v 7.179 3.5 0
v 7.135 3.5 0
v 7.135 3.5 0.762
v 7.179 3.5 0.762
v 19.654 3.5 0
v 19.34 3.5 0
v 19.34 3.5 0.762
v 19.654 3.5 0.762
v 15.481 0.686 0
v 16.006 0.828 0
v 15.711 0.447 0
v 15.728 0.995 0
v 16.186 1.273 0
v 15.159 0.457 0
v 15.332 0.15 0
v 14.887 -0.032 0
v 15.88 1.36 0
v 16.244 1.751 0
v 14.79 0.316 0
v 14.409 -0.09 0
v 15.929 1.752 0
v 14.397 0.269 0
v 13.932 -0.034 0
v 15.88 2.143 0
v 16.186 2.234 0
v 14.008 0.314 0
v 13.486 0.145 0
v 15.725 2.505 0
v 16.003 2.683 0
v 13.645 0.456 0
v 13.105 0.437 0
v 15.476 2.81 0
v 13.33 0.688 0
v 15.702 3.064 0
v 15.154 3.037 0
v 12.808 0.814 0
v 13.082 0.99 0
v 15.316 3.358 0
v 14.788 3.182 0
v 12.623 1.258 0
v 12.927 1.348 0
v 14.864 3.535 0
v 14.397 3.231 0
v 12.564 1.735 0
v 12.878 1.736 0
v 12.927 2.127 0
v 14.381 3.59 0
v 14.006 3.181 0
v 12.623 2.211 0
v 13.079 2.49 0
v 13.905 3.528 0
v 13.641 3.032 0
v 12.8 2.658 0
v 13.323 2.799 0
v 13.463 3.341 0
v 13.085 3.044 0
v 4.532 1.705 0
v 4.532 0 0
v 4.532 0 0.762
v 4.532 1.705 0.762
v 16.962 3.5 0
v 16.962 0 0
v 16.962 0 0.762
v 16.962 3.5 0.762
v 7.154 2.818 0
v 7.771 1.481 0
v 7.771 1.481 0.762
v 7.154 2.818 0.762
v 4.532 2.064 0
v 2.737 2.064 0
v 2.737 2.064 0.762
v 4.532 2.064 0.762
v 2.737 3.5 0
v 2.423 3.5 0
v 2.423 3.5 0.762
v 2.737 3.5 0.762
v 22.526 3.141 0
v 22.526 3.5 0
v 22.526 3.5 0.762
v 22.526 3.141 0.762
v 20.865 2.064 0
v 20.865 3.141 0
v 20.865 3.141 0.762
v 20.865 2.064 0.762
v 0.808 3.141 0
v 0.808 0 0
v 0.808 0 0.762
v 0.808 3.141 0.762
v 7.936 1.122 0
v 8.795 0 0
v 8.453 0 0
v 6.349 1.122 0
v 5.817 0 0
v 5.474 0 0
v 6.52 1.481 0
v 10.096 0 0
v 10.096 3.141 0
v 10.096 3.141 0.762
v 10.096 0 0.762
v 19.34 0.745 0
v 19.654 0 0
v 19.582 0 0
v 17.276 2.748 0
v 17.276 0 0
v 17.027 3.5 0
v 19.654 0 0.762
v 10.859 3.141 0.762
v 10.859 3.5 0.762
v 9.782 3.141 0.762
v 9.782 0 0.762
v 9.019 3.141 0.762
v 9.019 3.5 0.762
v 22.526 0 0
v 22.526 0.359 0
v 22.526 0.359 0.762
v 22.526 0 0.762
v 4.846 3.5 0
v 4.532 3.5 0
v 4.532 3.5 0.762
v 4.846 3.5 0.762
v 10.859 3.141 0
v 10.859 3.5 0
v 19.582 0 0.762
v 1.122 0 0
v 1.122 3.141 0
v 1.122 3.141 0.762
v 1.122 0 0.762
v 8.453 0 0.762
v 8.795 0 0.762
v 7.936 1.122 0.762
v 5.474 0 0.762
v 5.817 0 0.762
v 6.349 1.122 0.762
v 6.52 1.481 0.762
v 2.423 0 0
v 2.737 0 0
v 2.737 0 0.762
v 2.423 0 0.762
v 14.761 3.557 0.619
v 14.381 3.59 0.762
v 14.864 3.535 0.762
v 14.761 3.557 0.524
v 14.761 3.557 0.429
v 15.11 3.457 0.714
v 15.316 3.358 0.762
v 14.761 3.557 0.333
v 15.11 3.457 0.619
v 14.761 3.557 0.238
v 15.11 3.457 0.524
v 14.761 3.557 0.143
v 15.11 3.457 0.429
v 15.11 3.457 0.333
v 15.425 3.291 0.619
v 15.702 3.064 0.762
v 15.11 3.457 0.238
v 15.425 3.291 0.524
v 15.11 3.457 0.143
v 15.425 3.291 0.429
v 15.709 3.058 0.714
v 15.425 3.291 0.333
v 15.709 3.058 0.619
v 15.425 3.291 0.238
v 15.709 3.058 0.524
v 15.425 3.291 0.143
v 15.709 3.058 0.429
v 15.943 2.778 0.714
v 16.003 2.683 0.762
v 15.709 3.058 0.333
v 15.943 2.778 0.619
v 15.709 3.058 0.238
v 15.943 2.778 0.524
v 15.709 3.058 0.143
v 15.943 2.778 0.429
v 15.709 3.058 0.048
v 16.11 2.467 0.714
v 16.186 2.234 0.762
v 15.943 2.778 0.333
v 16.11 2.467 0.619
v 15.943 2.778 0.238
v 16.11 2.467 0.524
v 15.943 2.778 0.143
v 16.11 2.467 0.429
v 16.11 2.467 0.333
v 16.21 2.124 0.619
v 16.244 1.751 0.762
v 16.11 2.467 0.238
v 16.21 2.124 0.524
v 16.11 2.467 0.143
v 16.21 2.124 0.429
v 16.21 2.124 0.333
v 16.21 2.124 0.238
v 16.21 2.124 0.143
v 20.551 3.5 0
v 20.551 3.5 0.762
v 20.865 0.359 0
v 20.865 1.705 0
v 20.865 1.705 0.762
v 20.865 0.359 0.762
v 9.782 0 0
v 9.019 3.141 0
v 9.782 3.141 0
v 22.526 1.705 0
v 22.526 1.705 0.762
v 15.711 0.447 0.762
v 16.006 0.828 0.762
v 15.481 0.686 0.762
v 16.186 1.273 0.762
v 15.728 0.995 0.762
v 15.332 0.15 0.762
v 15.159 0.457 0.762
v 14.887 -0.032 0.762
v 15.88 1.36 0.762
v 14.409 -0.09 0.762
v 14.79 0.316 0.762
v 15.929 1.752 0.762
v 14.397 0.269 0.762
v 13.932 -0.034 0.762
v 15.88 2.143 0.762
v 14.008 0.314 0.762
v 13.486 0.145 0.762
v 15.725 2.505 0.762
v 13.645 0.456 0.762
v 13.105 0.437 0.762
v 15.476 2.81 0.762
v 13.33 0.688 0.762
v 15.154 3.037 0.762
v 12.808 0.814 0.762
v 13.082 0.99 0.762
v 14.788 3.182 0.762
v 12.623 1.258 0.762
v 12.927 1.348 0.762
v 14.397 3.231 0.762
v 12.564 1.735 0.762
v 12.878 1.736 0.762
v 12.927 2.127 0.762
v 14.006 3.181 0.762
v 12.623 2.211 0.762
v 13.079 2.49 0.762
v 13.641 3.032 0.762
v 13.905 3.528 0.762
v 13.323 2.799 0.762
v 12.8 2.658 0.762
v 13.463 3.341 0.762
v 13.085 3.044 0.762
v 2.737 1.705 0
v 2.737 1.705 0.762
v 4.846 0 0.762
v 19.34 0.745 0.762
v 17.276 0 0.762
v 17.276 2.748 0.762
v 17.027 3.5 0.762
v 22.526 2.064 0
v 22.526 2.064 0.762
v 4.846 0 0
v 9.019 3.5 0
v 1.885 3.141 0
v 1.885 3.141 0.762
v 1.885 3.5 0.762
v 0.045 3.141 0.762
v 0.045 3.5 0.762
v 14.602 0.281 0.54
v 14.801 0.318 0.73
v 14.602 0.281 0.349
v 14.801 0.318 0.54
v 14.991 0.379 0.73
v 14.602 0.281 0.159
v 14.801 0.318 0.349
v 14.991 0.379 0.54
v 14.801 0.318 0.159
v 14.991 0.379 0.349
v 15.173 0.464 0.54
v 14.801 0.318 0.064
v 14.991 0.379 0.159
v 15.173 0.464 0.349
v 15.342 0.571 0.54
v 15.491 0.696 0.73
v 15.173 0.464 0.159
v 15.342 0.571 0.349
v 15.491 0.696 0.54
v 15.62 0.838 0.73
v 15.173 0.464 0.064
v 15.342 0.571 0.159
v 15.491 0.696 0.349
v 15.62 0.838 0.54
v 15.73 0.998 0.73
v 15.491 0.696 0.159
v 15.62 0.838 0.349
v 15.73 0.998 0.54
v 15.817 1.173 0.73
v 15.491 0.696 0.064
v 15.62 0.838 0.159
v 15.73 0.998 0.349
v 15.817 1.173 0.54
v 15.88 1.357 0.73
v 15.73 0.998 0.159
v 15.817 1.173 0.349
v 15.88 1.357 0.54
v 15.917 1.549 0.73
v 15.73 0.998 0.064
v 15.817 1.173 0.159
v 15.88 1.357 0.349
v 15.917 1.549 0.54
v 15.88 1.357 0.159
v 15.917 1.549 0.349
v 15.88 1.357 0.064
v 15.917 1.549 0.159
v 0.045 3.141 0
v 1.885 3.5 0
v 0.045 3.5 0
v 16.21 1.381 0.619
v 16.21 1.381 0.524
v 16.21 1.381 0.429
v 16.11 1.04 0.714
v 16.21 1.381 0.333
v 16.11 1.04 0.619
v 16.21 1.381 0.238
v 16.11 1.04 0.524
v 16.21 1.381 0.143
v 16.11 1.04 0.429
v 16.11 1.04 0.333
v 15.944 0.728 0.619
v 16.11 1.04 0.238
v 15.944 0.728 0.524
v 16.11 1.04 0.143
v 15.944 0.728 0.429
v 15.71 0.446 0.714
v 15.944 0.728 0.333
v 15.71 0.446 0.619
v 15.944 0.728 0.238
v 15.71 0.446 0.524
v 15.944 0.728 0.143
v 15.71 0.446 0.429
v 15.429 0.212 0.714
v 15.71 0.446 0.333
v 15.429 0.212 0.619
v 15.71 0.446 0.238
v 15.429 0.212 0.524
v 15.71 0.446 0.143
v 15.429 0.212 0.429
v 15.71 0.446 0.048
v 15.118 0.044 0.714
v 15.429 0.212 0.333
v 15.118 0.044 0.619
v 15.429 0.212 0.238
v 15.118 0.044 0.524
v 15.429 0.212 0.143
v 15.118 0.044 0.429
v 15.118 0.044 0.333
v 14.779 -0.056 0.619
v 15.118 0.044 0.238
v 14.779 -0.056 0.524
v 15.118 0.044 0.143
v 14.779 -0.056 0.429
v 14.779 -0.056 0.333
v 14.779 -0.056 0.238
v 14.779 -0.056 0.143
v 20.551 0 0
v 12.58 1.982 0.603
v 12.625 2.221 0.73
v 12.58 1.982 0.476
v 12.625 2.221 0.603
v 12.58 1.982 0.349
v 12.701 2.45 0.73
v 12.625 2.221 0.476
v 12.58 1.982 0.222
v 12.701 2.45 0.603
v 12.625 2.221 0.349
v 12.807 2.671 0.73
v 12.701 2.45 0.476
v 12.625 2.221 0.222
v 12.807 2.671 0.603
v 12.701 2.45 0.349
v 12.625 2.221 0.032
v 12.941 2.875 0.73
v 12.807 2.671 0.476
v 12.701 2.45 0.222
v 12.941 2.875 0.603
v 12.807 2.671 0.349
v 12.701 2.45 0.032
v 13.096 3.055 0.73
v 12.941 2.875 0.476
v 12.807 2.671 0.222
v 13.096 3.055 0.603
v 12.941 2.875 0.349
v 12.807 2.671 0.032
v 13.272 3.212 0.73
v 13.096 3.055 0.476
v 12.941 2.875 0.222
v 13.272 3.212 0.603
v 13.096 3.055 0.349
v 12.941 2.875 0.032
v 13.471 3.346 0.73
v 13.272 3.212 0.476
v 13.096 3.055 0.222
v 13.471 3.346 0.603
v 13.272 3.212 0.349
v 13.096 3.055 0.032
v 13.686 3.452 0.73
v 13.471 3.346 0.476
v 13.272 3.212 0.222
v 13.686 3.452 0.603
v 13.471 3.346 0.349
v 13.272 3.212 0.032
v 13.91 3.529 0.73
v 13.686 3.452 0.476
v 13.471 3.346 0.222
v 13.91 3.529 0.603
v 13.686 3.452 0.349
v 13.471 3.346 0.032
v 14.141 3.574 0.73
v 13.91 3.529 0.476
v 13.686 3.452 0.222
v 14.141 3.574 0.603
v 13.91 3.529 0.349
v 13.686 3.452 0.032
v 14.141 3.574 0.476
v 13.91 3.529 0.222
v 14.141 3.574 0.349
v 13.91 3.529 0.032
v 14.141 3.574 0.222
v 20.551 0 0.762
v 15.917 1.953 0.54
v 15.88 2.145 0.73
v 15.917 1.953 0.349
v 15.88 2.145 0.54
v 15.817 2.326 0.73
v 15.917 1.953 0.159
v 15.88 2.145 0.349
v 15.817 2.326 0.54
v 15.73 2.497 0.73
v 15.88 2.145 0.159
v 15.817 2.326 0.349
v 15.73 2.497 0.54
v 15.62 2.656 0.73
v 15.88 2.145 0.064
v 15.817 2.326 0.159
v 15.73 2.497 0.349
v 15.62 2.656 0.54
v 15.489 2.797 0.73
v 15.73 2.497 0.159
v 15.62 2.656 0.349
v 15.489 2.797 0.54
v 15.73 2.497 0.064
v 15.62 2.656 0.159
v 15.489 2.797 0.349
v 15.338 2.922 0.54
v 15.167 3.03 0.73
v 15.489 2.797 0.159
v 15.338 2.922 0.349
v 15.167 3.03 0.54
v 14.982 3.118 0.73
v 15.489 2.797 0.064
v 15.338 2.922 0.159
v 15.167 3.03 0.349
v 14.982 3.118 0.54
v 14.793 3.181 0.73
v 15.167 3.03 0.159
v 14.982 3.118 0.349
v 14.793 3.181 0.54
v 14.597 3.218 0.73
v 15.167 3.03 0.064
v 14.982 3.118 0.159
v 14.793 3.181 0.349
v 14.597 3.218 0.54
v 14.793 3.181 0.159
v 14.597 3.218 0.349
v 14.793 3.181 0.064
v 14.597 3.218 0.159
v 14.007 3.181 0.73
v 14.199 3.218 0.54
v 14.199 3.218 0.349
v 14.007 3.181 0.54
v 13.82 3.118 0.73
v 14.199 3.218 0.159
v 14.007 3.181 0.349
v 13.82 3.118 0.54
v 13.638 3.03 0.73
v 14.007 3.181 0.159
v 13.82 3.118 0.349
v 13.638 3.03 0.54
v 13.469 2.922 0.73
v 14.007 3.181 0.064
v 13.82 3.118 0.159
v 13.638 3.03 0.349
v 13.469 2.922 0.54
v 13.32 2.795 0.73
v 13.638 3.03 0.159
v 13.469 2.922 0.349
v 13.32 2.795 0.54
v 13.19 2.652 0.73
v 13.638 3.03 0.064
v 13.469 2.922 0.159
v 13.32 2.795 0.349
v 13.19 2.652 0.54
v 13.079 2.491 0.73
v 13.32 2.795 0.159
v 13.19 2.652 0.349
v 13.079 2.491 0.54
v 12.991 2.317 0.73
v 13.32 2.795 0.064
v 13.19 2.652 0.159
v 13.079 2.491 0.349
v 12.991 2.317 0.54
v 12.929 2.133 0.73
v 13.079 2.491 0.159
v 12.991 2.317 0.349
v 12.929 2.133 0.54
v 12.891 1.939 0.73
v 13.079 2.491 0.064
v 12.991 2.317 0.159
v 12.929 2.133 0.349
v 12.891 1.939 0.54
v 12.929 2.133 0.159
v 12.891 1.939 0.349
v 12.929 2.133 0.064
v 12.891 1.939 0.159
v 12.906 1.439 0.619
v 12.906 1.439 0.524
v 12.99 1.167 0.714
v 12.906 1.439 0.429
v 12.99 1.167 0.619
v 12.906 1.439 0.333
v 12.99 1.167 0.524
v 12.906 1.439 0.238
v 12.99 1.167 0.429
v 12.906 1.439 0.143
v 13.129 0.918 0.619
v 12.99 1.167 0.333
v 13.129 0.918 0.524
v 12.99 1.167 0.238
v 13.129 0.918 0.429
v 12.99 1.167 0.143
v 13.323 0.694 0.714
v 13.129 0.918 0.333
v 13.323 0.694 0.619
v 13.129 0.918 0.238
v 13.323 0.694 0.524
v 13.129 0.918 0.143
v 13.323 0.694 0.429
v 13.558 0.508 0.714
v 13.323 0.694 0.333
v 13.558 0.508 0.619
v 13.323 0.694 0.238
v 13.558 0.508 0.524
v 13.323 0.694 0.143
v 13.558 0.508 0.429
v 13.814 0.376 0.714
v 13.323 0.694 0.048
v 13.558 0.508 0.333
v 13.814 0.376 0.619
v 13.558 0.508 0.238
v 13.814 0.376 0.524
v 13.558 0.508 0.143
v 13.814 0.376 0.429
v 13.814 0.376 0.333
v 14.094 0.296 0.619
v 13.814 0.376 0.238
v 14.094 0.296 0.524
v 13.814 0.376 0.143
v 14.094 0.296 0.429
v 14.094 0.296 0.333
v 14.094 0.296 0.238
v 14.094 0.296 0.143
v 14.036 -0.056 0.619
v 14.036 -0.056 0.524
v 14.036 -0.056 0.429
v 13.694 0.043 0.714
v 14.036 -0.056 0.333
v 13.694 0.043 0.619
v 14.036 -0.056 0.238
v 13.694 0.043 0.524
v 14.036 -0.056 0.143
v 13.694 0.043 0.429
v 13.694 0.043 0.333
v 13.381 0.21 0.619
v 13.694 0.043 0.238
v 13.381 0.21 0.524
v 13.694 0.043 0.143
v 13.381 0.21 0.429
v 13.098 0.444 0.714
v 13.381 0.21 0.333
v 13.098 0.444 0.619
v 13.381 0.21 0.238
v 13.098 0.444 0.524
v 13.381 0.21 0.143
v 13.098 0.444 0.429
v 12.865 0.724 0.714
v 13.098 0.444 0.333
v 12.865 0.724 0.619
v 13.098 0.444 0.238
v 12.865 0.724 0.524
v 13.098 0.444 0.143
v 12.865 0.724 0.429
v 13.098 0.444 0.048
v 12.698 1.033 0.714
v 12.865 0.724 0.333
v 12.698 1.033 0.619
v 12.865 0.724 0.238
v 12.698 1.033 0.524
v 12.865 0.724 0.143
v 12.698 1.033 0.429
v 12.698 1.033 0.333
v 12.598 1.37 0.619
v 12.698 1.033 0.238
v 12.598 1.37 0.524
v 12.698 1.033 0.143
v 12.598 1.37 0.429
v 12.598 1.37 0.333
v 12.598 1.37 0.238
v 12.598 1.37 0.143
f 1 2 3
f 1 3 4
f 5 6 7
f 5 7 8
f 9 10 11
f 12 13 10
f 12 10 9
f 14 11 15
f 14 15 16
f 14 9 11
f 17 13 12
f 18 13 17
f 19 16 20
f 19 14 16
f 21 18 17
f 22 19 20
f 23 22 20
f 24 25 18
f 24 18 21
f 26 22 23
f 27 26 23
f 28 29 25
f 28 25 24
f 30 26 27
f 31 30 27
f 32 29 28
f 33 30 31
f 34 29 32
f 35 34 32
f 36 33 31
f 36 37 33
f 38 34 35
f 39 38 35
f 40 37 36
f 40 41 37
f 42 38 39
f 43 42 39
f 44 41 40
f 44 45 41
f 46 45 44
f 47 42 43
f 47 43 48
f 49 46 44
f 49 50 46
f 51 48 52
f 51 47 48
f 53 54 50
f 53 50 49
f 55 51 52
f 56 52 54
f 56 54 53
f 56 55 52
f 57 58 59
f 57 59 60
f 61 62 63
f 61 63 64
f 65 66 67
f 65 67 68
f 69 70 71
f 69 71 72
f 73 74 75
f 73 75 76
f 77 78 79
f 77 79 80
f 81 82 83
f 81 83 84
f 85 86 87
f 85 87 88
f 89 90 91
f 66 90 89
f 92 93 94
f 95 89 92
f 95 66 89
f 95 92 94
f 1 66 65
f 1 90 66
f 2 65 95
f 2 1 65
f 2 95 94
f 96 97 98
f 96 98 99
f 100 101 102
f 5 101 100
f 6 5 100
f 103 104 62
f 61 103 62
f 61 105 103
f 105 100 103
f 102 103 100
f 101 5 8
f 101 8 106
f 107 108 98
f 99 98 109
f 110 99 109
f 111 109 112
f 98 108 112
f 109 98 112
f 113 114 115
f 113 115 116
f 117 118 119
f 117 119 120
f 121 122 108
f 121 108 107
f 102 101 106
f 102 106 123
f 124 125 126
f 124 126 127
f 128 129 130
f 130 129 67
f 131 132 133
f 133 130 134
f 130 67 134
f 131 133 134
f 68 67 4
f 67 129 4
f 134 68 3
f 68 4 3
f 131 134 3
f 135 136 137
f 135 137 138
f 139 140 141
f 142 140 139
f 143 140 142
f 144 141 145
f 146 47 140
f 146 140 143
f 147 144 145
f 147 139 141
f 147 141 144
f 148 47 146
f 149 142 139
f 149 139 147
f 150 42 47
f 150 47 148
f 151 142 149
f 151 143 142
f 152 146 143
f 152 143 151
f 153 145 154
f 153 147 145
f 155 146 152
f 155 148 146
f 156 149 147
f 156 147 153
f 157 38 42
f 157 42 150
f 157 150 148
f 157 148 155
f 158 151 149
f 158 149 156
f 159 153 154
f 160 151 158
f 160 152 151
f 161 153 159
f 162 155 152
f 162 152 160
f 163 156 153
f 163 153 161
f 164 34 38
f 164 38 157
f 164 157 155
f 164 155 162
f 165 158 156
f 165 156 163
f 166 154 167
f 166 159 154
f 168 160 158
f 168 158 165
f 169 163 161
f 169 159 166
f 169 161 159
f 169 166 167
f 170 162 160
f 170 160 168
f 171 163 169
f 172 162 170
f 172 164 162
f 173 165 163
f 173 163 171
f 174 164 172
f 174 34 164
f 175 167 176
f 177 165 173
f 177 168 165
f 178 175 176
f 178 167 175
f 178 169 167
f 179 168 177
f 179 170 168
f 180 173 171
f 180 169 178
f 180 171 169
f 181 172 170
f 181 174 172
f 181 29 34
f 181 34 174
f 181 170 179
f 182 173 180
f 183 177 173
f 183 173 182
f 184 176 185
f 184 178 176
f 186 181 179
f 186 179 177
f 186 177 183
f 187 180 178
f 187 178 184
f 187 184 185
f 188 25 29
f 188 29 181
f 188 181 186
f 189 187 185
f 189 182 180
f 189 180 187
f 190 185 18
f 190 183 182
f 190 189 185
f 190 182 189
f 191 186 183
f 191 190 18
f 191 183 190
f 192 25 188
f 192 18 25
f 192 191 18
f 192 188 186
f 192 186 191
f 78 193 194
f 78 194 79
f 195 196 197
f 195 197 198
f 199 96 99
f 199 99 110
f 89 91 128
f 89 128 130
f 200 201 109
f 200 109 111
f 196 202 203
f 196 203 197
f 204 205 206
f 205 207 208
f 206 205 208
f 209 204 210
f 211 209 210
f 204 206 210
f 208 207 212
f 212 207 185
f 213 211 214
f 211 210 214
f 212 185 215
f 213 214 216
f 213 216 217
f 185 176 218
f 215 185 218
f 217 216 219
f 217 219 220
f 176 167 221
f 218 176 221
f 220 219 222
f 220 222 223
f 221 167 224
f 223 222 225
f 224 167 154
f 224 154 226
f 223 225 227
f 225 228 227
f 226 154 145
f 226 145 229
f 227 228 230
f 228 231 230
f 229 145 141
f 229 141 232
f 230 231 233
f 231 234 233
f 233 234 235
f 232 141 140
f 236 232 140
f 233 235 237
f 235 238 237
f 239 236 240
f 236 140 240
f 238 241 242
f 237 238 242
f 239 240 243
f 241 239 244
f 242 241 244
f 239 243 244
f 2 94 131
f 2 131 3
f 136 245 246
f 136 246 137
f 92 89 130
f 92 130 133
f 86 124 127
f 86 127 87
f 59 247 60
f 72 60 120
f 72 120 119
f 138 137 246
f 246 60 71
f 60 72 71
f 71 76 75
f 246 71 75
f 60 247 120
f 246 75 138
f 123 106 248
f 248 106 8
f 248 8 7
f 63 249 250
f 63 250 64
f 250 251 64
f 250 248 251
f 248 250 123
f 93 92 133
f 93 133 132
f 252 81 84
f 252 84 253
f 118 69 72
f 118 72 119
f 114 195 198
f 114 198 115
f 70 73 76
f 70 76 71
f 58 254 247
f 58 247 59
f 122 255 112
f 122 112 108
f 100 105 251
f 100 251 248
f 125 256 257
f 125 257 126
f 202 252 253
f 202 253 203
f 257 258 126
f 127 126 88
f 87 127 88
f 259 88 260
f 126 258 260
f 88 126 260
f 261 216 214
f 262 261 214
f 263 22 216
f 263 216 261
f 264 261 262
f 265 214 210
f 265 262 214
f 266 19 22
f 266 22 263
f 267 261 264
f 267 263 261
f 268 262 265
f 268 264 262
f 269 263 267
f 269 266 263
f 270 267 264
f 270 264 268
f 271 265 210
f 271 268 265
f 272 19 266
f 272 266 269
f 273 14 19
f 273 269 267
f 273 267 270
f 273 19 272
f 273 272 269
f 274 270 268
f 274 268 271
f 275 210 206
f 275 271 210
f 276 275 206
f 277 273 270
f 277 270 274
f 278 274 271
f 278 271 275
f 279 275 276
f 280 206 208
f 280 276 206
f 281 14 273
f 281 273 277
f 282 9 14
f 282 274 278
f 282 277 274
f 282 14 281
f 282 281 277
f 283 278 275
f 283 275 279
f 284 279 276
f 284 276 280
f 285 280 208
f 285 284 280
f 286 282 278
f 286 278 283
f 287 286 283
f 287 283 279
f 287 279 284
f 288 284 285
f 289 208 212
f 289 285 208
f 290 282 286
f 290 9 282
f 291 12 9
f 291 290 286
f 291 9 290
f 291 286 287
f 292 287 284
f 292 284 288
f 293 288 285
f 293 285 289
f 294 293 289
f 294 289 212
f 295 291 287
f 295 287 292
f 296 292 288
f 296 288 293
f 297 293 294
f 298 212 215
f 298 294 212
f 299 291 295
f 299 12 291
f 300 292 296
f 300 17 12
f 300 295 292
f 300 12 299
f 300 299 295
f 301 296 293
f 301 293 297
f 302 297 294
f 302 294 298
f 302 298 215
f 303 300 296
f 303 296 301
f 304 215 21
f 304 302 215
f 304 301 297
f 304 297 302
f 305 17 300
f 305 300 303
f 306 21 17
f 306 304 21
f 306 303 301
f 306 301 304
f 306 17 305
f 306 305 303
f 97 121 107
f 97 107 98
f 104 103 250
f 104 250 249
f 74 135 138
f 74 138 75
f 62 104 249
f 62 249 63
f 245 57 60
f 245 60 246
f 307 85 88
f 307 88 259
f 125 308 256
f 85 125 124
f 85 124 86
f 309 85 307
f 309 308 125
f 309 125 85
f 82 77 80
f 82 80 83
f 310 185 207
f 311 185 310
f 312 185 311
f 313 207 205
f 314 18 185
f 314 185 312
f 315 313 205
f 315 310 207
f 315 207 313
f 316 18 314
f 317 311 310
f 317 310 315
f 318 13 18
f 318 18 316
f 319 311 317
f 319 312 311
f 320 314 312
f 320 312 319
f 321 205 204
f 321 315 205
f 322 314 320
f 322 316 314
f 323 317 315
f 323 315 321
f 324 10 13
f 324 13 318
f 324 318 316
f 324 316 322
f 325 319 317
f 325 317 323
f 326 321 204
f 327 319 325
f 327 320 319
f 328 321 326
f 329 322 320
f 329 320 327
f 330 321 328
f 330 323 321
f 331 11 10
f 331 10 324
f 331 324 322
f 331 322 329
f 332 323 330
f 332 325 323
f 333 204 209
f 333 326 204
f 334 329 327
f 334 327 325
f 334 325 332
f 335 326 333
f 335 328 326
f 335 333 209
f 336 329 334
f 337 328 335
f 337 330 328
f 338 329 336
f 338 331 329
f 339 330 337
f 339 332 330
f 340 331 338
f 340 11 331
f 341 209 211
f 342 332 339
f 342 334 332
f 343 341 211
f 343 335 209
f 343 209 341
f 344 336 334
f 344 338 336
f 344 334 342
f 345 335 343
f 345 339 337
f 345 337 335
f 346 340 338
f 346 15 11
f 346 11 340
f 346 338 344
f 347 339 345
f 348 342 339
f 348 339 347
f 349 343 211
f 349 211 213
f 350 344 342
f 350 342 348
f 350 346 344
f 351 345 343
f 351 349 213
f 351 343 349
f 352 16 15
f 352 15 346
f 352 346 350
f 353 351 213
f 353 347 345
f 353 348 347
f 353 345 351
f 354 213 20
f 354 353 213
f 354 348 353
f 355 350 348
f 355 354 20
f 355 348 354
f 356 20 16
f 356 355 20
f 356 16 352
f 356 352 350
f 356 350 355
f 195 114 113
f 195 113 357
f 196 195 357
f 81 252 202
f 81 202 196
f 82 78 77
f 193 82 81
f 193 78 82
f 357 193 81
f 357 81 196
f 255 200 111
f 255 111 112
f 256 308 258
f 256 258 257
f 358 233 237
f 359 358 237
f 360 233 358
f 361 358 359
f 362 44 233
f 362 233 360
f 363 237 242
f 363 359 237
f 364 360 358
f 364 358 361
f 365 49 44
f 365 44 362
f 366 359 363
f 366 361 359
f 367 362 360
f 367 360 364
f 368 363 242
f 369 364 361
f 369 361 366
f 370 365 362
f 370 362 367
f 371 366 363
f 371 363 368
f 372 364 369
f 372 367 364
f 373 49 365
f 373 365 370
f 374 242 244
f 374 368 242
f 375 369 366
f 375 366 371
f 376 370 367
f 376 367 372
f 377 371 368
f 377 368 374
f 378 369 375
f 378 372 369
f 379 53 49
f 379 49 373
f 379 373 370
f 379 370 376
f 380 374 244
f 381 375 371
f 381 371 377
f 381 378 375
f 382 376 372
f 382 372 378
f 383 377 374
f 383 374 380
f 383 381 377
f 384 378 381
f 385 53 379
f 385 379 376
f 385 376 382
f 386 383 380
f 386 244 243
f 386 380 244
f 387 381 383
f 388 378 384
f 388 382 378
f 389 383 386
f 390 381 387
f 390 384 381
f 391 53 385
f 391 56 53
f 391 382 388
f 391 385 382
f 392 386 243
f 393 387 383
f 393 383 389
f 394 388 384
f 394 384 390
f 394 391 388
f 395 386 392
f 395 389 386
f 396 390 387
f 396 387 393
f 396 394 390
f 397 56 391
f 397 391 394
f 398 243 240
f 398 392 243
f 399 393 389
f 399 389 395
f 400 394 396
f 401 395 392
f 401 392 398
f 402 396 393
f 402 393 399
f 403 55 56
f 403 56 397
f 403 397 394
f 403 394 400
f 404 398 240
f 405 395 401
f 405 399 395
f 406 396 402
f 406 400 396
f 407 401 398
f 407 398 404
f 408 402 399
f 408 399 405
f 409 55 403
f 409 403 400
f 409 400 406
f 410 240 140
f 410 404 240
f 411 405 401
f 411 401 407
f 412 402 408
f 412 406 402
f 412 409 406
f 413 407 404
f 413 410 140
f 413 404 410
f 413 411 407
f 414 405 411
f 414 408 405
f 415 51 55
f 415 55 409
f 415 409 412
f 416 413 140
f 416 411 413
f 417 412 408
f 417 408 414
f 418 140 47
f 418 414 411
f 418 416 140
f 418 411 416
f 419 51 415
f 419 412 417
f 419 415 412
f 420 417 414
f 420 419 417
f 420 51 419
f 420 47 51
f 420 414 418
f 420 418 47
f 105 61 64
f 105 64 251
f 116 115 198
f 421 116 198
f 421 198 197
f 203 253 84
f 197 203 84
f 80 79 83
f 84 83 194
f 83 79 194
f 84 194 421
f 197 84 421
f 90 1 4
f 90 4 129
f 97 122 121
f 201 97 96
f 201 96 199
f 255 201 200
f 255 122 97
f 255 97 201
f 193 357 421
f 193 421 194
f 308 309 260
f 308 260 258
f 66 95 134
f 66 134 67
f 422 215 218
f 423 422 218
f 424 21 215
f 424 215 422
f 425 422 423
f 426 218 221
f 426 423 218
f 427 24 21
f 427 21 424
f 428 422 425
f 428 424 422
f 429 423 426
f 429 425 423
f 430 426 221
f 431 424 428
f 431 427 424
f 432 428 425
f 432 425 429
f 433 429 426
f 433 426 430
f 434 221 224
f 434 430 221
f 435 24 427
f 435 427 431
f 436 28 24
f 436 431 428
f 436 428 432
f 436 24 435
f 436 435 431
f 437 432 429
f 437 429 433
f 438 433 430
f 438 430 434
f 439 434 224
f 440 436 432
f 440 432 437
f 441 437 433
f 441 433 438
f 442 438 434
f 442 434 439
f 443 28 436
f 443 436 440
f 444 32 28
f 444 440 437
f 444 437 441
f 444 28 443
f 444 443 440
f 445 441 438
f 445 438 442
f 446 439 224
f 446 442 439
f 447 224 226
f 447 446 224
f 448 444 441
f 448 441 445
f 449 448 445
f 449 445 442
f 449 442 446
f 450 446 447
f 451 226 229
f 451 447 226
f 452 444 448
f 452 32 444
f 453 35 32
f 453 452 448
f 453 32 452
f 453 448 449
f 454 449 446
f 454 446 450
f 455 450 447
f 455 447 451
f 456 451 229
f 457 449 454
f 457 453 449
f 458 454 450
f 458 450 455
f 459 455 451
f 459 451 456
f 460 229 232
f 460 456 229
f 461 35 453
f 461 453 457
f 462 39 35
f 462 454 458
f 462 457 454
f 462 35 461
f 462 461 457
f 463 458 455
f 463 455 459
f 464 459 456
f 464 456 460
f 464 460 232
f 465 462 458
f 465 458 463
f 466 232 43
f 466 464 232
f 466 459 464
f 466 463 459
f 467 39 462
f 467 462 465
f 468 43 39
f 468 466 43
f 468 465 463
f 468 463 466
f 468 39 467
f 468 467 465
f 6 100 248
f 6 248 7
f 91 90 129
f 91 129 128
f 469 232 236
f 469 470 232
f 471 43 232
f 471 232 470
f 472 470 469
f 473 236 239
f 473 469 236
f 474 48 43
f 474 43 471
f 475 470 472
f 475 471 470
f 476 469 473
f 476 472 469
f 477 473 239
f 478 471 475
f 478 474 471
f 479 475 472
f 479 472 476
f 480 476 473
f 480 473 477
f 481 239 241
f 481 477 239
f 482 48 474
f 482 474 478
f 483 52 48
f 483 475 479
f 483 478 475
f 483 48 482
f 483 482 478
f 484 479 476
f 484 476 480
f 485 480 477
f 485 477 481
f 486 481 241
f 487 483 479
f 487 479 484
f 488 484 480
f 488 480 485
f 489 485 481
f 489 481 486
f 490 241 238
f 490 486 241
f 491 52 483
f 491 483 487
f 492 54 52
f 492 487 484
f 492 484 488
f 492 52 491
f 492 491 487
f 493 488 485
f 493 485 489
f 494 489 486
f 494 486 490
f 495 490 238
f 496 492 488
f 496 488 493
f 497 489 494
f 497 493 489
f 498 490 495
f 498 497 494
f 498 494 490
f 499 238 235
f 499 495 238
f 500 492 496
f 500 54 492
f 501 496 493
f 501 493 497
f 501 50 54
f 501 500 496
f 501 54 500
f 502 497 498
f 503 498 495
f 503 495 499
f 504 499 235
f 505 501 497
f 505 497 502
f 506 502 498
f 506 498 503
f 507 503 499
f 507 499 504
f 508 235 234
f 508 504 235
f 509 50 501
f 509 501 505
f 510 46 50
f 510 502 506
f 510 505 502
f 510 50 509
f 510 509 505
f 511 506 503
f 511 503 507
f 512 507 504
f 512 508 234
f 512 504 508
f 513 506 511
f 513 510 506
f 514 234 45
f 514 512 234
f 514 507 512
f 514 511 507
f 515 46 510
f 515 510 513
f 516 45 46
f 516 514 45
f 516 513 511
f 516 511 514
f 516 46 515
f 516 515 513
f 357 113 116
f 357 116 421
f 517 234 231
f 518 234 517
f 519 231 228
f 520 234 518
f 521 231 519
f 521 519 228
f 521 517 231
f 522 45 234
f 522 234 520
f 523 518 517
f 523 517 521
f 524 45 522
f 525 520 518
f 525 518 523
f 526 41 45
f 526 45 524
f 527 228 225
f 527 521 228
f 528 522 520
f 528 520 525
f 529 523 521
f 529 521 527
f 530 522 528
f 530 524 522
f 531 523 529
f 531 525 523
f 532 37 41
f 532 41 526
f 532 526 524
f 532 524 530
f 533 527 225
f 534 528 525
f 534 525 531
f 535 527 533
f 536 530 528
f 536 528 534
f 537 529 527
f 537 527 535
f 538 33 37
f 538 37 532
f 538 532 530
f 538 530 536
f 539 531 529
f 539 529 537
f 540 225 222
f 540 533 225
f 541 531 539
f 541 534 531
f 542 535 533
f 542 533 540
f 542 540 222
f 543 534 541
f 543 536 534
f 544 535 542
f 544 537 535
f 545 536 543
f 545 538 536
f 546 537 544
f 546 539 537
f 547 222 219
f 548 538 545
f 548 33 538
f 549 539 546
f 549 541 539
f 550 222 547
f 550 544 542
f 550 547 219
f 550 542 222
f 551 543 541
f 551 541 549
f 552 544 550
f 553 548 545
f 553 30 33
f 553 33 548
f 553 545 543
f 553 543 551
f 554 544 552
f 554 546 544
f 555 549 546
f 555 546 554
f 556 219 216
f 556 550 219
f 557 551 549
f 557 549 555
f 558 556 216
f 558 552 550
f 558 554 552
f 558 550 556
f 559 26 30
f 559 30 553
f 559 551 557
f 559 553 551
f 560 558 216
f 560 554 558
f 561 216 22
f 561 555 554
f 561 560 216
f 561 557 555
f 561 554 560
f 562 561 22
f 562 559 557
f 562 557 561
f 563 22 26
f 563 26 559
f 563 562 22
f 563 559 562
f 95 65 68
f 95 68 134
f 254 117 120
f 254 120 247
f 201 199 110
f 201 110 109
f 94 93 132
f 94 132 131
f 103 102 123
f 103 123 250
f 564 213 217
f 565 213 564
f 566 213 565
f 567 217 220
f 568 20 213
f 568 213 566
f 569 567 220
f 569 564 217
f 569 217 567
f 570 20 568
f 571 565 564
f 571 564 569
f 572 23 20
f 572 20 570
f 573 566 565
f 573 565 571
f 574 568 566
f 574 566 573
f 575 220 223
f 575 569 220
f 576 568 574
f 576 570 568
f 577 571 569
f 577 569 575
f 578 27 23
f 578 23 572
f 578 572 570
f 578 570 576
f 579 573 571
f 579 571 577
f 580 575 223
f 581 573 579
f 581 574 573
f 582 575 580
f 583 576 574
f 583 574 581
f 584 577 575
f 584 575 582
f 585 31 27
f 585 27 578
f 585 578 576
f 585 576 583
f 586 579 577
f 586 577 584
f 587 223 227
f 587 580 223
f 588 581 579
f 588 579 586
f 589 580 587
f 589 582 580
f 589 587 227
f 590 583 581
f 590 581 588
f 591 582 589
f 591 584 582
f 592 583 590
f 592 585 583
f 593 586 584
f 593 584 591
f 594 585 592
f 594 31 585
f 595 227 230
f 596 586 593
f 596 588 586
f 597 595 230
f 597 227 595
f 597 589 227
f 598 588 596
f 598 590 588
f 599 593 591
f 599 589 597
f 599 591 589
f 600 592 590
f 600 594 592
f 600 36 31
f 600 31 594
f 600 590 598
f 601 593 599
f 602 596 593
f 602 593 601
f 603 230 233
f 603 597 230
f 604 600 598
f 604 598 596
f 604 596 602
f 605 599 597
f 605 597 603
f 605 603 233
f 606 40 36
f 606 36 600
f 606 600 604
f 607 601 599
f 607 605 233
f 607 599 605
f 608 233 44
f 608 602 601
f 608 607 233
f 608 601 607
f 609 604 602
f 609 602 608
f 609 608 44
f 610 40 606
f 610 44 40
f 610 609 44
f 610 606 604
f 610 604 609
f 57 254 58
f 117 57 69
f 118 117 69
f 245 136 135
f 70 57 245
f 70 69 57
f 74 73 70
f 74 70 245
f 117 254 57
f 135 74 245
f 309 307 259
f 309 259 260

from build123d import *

# Parameters (mm, degrees)
BOSS_EXTRUDE1_DEPTH   = 0.762
BOSS_EXTRUDE1_2_DEPTH = 0.762
BOSS_EXTRUDE1_3_DEPTH = 0.762
BOSS_EXTRUDE1_4_DEPTH = 0.762
BOSS_EXTRUDE1_5_DEPTH = 0.762
BOSS_EXTRUDE1_6_DEPTH = 0.762
BOSS_EXTRUDE1_7_DEPTH = 0.762


with BuildPart() as part:
    # Sketch1 → Boss-Extrude1 (new body)
    with BuildSketch(Plane.XY):
        Polygon((0.044871795, 3.141025641), (0.044871795, 3.5), (1.884615385, 3.5), (1.884615385, 3.141025641), (1.121794872, 3.141025641), (1.121794872, 0), (0.807692308, 0), (0.807692308, 3.141025641), align=None)
    extrude(amount=BOSS_EXTRUDE1_DEPTH)


with BuildPart() as body_2:
    # Sketch1 → Boss-Extrude1 2 (new body)
    with BuildSketch(Plane.XY):
        Polygon((2.423076923, 3.5), (2.737179487, 3.5), (2.737179487, 2.064102564), (4.532051282, 2.064102564), (4.532051282, 3.5), (4.846153846, 3.5), (4.846153846, 0), (4.532051282, 0), (4.532051282, 1.705128205), (2.737179487, 1.705128205), (2.737179487, 0), (2.423076923, 0), align=None)
    extrude(amount=BOSS_EXTRUDE1_2_DEPTH)


with BuildPart() as body_3:
    # Sketch1 → Boss-Extrude1 3 (new body)
    with BuildSketch(Plane.XY):
        Polygon((7.179487179, 3.5), (8.794871795, 0), (8.453425481, 0), (7.935997596, 1.121794872), (6.349358974, 1.121794872), (5.817207532, 0), (5.474358974, 0), (7.134615385, 3.5), align=None)
        Polygon((7.153545673, 2.817808494), (6.519731571, 1.480769231), (7.770532853, 1.480769231), align=None, mode=Mode.SUBTRACT)
    extrude(amount=BOSS_EXTRUDE1_3_DEPTH)


with BuildPart() as body_4:
    # Sketch1 → Boss-Extrude1 4 (new body)
    with BuildSketch(Plane.XY):
        Polygon((9.019230769, 3.141025641), (9.019230769, 3.5), (10.858974359, 3.5), (10.858974359, 3.141025641), (10.096153846, 3.141025641), (10.096153846, 0), (9.782051282, 0), (9.782051282, 3.141025641), align=None)
    extrude(amount=BOSS_EXTRUDE1_4_DEPTH)


with BuildPart() as body_5:
    # Sketch1 → Boss-Extrude1 5 (new body)
    with BuildSketch(Plane.XY):
        with BuildLine():
            add(Edge.make_bspline(
                [(14.381410256, 3.58974359), (14.446218362, 3.58810211), (14.573506829, 3.584878109), (14.760581727, 3.560199006), (14.939176822, 3.517503616), (15.110746961, 3.460640633), (15.273239938, 3.384786248), (15.42787883, 3.2931011), (15.574295704, 3.184624641), (15.710517085, 3.060195414), (15.835174036, 2.92481196), (15.944999922, 2.78033405), (16.037042216, 2.627635248), (16.112628003, 2.467174417), (16.171926613, 2.299314449), (16.212845656, 2.123160446), (16.238983806, 1.939853756), (16.242039584, 1.814826892), (16.243589744, 1.751402244)],
                knots=[0, 0, 0, 0, 1.065120563, 2.091984664, 3.0946048, 4.079830382, 5.057816894, 6.036188127, 7.030412546, 8.04752943, 9.064399622, 10.05169764, 11.02544977, 11.989514704, 12.962713494, 13.945757189, 14.957906945, 16, 16, 16, 16], degree=3))
            add(Edge.make_bspline(
                [(16.243589744, 1.751402244), (16.242039811, 1.688444797), (16.238984714, 1.564348377), (16.212815937, 1.382204933), (16.171774937, 1.207114236), (16.113178671, 1.039368583), (16.037953192, 0.87879102), (15.945298021, 0.725804066), (15.83615681, 0.580357567), (15.711949959, 0.444044902), (15.576548917, 0.319047431), (15.431318651, 0.210128556), (15.279525331, 0.116404431), (15.119215623, 0.041620757), (14.952515586, -0.018151163), (14.777933263, -0.058903793), (14.596286709, -0.085190837), (14.472415705, -0.088209353), (14.409455128, -0.08974359)],
                knots=[0, 0, 0, 0, 1.043624062, 2.057103931, 3.04512605, 4.022047818, 4.998200453, 5.980619268, 6.982898556, 8.009068085, 9.034988726, 10.034168286, 11.015286542, 11.987931943, 12.962482838, 13.94673481, 14.956375938, 16, 16, 16, 16], degree=3))
            add(Edge.make_bspline(
                [(14.409455128, -0.08974359), (14.346030809, -0.088194203), (14.221004593, -0.085139949), (14.037467558, -0.058958544), (13.861189814, -0.01801724), (13.692675463, 0.040492196), (13.531830533, 0.116109427), (13.378340451, 0.208313806), (13.232821303, 0.317720947), (13.096479557, 0.441887521), (12.971730359, 0.577059073), (12.862970983, 0.721893329), (12.77074587, 0.873548785), (12.695382537, 1.032446309), (12.635718078, 1.197817752), (12.59501326, 1.370766229), (12.568677308, 1.550305735), (12.565642461, 1.672548634), (12.564102564, 1.734575321)],
                knots=[0, 0, 0, 0, 1.053102029, 2.075944431, 3.073151272, 4.055350789, 5.033113405, 6.020478099, 7.024410459, 8.052272461, 9.079885166, 10.07527673, 11.055994387, 12.023226415, 12.992069828, 13.970394897, 14.97016774, 16, 16, 16, 16], degree=3))
            add(Edge.make_bspline(
                [(12.564102564, 1.734575321), (12.5646372, 1.77620799), (12.565699726, 1.858948113), (12.578491418, 1.981814713), (12.59705312, 2.102705371), (12.623655032, 2.221276319), (12.658446699, 2.337237304), (12.699498727, 2.451388067), (12.749638572, 2.56257179), (12.80631922, 2.671315182), (12.869581028, 2.775923088), (12.939456777, 2.874802671), (13.013492146, 2.968783668), (13.09465554, 3.055430672), (13.180271985, 3.137264328), (13.271730363, 3.213027045), (13.368472607, 3.283401996), (13.470914987, 3.346822337), (13.576533262, 3.404181472), (13.68541004, 3.453403323), (13.796066611, 3.495649384), (13.909021259, 3.529890209), (14.023974031, 3.556922245), (14.141175816, 3.575329599), (14.260533242, 3.588153917), (14.340944561, 3.589211419), (14.381410256, 3.58974359)],
                knots=[0, 0, 0, 0, 1.037015668, 2.060948919, 3.074880161, 4.083647147, 5.086022904, 6.090072063, 7.104153813, 8.122640571, 9.144368836, 10.147691507, 11.138137339, 12.123020368, 13.103399296, 14.087645067, 15.080126199, 16.082011238, 17.087798457, 18.072939717, 19.057185487, 20.037253025, 21.01195951, 21.997135196, 22.992090687, 24, 24, 24, 24], degree=3))
        make_face()
        with BuildLine():
            add(Edge.make_bspline(
                [(14.396834936, 3.230769231), (14.363620302, 3.230364341), (14.297508569, 3.229558431), (14.199224033, 3.218942715), (14.102232099, 3.203812826), (14.006512737, 3.182231305), (13.912466448, 3.152827253), (13.819216607, 3.118986345), (13.727613553, 3.077765254), (13.637959695, 3.03119255), (13.55104462, 2.979643629), (13.469031918, 2.922671862), (13.391709274, 2.861613307), (13.319266008, 2.79632547), (13.251914836, 2.726475868), (13.188330134, 2.653123432), (13.131060552, 2.574171541), (13.078574976, 2.491761134), (13.031607135, 2.405999553), (12.989841781, 2.317789691), (12.955677772, 2.226412004), (12.927815395, 2.132857846), (12.904715585, 2.037275387), (12.890081661, 1.938939538), (12.879349301, 1.838344426), (12.878589456, 1.770362572), (12.878205128, 1.735977564)],
                knots=[0, 0, 0, 0, 1.008559885, 2.007477868, 2.99961109, 3.989939068, 4.984837346, 5.991145699, 7.001802488, 8.033829008, 9.059044045, 10.069351652, 11.065060232, 12.050310815, 13.029377138, 14.011219647, 14.996725999, 15.989392538, 16.977580475, 17.965360261, 18.951710183, 19.937753436, 20.929683414, 21.935841486, 22.955955122, 24, 24, 24, 24], degree=3))
            add(Edge.make_bspline(
                [(12.878205128, 1.735977564), (12.87947999, 1.685415343), (12.881988038, 1.585943813), (12.903945608, 1.440175669), (12.937767583, 1.300087383), (12.987624949, 1.166445474), (13.049975564, 1.038101191), (13.127002454, 0.916193086), (13.21826154, 0.800688212), (13.321925066, 0.692392943), (13.435247773, 0.593547138), (13.555580503, 0.50678373), (13.68163411, 0.43337348), (13.813737313, 0.373568408), (13.951184852, 0.32617867), (14.094862403, 0.293700039), (14.243812863, 0.272324583), (14.345343518, 0.270271827), (14.396834936, 0.269230769)],
                knots=[0, 0, 0, 0, 1.032063989, 2.030389145, 3.003944642, 3.970395727, 4.937377036, 5.913328081, 6.909231446, 7.93887556, 8.970685674, 9.976071282, 10.964166581, 11.944589148, 12.933237628, 13.927779006, 14.949070134, 16, 16, 16, 16], degree=3))
            add(Edge.make_bspline(
                [(14.396834936, 0.269230769), (14.431444438, 0.269706274), (14.500085474, 0.270649342), (14.602180996, 0.280148018), (14.702437208, 0.295379888), (14.800713488, 0.317310543), (14.896898299, 0.34475775), (14.991393102, 0.377365478), (15.083191393, 0.418046682), (15.17345123, 0.462994633), (15.259847472, 0.514234791), (15.342323004, 0.56927294), (15.418798984, 0.630241561), (15.491188056, 0.694559374), (15.558815745, 0.763523221), (15.621224729, 0.837043443), (15.678204861, 0.9155841), (15.730670508, 0.997869506), (15.77747377, 1.083865759), (15.81825287, 1.172395437), (15.852848985, 1.263240546), (15.88077749, 1.356532118), (15.902662952, 1.452092966), (15.917742872, 1.550051045), (15.92829131, 1.650210387), (15.929086388, 1.717954243), (15.929487179, 1.752103365)],
                knots=[0, 0, 0, 0, 1.047197238, 2.076906641, 3.100256066, 4.114471768, 5.12198147, 6.126382909, 7.136867548, 8.15857795, 9.17633901, 10.174870724, 11.156907918, 12.133735059, 13.104061851, 14.077631395, 15.04955518, 16.038496417, 17.029181396, 18.010275684, 18.986308667, 19.968651475, 20.955262928, 21.950658345, 22.966943676, 24, 24, 24, 24], degree=3))
            add(Edge.make_bspline(
                [(15.929487179, 1.752103365), (15.929086067, 1.78601887), (15.928290385, 1.85329652), (15.91774791, 1.952757338), (15.90264702, 2.05001055), (15.880884312, 2.144674353), (15.852834158, 2.236772878), (15.818246828, 2.326219625), (15.777461528, 2.413347821), (15.730653304, 2.497942118), (15.678037481, 2.579116855), (15.620543237, 2.656719268), (15.557177889, 2.729292009), (15.489751864, 2.798626703), (15.416580979, 2.863244593), (15.337996685, 2.923167114), (15.254953007, 2.979840388), (15.167025772, 3.03096595), (15.076281818, 3.078180182), (14.98316786, 3.118631186), (14.88873876, 3.153003305), (14.793234648, 3.18232027), (14.69585167, 3.2037283), (14.597247841, 3.21895635), (14.497559582, 3.229554736), (14.430516362, 3.230363114), (14.396834936, 3.230769231)],
                knots=[0, 0, 0, 0, 1.02996197, 2.043119294, 3.035359645, 4.018872909, 4.991431989, 5.957985074, 6.929999688, 7.912076566, 8.892894881, 9.867085534, 10.843653904, 11.817741046, 12.803660682, 13.806313499, 14.818574707, 15.856120519, 16.894564902, 17.924820532, 18.937903209, 19.946497019, 20.957711757, 21.963978472, 22.977135795, 24, 24, 24, 24], degree=3))
        make_face(mode=Mode.SUBTRACT)
    extrude(amount=BOSS_EXTRUDE1_5_DEPTH)


with BuildPart() as body_6:
    # Sketch1 → Boss-Extrude1 6 (new body)
    with BuildSketch(Plane.XY):
        Polygon((16.961538462, 0), (16.961538462, 3.5), (17.02744391, 3.5), (19.33974359, 0.745292468), (19.33974359, 3.5), (19.653846154, 3.5), (19.653846154, 0), (19.582331731, 0), (17.275641026, 2.748397436), (17.275641026, 0), align=None)
    extrude(amount=BOSS_EXTRUDE1_6_DEPTH)


with BuildPart() as body_7:
    # Sketch1 → Boss-Extrude1 7 (new body)
    with BuildSketch(Plane.XY):
        Polygon((20.551282051, 3.5), (22.525641026, 3.5), (22.525641026, 3.141025641), (20.865384615, 3.141025641), (20.865384615, 2.064102564), (22.525641026, 2.064102564), (22.525641026, 1.705128205), (20.865384615, 1.705128205), (20.865384615, 0.358974359), (22.525641026, 0.358974359), (22.525641026, 0), (20.551282051, 0), align=None)
    extrude(amount=BOSS_EXTRUDE1_7_DEPTH)


solid = Compound([part.part, body_2.part, body_3.part, body_4.part, body_5.part, body_6.part, body_7.part])
